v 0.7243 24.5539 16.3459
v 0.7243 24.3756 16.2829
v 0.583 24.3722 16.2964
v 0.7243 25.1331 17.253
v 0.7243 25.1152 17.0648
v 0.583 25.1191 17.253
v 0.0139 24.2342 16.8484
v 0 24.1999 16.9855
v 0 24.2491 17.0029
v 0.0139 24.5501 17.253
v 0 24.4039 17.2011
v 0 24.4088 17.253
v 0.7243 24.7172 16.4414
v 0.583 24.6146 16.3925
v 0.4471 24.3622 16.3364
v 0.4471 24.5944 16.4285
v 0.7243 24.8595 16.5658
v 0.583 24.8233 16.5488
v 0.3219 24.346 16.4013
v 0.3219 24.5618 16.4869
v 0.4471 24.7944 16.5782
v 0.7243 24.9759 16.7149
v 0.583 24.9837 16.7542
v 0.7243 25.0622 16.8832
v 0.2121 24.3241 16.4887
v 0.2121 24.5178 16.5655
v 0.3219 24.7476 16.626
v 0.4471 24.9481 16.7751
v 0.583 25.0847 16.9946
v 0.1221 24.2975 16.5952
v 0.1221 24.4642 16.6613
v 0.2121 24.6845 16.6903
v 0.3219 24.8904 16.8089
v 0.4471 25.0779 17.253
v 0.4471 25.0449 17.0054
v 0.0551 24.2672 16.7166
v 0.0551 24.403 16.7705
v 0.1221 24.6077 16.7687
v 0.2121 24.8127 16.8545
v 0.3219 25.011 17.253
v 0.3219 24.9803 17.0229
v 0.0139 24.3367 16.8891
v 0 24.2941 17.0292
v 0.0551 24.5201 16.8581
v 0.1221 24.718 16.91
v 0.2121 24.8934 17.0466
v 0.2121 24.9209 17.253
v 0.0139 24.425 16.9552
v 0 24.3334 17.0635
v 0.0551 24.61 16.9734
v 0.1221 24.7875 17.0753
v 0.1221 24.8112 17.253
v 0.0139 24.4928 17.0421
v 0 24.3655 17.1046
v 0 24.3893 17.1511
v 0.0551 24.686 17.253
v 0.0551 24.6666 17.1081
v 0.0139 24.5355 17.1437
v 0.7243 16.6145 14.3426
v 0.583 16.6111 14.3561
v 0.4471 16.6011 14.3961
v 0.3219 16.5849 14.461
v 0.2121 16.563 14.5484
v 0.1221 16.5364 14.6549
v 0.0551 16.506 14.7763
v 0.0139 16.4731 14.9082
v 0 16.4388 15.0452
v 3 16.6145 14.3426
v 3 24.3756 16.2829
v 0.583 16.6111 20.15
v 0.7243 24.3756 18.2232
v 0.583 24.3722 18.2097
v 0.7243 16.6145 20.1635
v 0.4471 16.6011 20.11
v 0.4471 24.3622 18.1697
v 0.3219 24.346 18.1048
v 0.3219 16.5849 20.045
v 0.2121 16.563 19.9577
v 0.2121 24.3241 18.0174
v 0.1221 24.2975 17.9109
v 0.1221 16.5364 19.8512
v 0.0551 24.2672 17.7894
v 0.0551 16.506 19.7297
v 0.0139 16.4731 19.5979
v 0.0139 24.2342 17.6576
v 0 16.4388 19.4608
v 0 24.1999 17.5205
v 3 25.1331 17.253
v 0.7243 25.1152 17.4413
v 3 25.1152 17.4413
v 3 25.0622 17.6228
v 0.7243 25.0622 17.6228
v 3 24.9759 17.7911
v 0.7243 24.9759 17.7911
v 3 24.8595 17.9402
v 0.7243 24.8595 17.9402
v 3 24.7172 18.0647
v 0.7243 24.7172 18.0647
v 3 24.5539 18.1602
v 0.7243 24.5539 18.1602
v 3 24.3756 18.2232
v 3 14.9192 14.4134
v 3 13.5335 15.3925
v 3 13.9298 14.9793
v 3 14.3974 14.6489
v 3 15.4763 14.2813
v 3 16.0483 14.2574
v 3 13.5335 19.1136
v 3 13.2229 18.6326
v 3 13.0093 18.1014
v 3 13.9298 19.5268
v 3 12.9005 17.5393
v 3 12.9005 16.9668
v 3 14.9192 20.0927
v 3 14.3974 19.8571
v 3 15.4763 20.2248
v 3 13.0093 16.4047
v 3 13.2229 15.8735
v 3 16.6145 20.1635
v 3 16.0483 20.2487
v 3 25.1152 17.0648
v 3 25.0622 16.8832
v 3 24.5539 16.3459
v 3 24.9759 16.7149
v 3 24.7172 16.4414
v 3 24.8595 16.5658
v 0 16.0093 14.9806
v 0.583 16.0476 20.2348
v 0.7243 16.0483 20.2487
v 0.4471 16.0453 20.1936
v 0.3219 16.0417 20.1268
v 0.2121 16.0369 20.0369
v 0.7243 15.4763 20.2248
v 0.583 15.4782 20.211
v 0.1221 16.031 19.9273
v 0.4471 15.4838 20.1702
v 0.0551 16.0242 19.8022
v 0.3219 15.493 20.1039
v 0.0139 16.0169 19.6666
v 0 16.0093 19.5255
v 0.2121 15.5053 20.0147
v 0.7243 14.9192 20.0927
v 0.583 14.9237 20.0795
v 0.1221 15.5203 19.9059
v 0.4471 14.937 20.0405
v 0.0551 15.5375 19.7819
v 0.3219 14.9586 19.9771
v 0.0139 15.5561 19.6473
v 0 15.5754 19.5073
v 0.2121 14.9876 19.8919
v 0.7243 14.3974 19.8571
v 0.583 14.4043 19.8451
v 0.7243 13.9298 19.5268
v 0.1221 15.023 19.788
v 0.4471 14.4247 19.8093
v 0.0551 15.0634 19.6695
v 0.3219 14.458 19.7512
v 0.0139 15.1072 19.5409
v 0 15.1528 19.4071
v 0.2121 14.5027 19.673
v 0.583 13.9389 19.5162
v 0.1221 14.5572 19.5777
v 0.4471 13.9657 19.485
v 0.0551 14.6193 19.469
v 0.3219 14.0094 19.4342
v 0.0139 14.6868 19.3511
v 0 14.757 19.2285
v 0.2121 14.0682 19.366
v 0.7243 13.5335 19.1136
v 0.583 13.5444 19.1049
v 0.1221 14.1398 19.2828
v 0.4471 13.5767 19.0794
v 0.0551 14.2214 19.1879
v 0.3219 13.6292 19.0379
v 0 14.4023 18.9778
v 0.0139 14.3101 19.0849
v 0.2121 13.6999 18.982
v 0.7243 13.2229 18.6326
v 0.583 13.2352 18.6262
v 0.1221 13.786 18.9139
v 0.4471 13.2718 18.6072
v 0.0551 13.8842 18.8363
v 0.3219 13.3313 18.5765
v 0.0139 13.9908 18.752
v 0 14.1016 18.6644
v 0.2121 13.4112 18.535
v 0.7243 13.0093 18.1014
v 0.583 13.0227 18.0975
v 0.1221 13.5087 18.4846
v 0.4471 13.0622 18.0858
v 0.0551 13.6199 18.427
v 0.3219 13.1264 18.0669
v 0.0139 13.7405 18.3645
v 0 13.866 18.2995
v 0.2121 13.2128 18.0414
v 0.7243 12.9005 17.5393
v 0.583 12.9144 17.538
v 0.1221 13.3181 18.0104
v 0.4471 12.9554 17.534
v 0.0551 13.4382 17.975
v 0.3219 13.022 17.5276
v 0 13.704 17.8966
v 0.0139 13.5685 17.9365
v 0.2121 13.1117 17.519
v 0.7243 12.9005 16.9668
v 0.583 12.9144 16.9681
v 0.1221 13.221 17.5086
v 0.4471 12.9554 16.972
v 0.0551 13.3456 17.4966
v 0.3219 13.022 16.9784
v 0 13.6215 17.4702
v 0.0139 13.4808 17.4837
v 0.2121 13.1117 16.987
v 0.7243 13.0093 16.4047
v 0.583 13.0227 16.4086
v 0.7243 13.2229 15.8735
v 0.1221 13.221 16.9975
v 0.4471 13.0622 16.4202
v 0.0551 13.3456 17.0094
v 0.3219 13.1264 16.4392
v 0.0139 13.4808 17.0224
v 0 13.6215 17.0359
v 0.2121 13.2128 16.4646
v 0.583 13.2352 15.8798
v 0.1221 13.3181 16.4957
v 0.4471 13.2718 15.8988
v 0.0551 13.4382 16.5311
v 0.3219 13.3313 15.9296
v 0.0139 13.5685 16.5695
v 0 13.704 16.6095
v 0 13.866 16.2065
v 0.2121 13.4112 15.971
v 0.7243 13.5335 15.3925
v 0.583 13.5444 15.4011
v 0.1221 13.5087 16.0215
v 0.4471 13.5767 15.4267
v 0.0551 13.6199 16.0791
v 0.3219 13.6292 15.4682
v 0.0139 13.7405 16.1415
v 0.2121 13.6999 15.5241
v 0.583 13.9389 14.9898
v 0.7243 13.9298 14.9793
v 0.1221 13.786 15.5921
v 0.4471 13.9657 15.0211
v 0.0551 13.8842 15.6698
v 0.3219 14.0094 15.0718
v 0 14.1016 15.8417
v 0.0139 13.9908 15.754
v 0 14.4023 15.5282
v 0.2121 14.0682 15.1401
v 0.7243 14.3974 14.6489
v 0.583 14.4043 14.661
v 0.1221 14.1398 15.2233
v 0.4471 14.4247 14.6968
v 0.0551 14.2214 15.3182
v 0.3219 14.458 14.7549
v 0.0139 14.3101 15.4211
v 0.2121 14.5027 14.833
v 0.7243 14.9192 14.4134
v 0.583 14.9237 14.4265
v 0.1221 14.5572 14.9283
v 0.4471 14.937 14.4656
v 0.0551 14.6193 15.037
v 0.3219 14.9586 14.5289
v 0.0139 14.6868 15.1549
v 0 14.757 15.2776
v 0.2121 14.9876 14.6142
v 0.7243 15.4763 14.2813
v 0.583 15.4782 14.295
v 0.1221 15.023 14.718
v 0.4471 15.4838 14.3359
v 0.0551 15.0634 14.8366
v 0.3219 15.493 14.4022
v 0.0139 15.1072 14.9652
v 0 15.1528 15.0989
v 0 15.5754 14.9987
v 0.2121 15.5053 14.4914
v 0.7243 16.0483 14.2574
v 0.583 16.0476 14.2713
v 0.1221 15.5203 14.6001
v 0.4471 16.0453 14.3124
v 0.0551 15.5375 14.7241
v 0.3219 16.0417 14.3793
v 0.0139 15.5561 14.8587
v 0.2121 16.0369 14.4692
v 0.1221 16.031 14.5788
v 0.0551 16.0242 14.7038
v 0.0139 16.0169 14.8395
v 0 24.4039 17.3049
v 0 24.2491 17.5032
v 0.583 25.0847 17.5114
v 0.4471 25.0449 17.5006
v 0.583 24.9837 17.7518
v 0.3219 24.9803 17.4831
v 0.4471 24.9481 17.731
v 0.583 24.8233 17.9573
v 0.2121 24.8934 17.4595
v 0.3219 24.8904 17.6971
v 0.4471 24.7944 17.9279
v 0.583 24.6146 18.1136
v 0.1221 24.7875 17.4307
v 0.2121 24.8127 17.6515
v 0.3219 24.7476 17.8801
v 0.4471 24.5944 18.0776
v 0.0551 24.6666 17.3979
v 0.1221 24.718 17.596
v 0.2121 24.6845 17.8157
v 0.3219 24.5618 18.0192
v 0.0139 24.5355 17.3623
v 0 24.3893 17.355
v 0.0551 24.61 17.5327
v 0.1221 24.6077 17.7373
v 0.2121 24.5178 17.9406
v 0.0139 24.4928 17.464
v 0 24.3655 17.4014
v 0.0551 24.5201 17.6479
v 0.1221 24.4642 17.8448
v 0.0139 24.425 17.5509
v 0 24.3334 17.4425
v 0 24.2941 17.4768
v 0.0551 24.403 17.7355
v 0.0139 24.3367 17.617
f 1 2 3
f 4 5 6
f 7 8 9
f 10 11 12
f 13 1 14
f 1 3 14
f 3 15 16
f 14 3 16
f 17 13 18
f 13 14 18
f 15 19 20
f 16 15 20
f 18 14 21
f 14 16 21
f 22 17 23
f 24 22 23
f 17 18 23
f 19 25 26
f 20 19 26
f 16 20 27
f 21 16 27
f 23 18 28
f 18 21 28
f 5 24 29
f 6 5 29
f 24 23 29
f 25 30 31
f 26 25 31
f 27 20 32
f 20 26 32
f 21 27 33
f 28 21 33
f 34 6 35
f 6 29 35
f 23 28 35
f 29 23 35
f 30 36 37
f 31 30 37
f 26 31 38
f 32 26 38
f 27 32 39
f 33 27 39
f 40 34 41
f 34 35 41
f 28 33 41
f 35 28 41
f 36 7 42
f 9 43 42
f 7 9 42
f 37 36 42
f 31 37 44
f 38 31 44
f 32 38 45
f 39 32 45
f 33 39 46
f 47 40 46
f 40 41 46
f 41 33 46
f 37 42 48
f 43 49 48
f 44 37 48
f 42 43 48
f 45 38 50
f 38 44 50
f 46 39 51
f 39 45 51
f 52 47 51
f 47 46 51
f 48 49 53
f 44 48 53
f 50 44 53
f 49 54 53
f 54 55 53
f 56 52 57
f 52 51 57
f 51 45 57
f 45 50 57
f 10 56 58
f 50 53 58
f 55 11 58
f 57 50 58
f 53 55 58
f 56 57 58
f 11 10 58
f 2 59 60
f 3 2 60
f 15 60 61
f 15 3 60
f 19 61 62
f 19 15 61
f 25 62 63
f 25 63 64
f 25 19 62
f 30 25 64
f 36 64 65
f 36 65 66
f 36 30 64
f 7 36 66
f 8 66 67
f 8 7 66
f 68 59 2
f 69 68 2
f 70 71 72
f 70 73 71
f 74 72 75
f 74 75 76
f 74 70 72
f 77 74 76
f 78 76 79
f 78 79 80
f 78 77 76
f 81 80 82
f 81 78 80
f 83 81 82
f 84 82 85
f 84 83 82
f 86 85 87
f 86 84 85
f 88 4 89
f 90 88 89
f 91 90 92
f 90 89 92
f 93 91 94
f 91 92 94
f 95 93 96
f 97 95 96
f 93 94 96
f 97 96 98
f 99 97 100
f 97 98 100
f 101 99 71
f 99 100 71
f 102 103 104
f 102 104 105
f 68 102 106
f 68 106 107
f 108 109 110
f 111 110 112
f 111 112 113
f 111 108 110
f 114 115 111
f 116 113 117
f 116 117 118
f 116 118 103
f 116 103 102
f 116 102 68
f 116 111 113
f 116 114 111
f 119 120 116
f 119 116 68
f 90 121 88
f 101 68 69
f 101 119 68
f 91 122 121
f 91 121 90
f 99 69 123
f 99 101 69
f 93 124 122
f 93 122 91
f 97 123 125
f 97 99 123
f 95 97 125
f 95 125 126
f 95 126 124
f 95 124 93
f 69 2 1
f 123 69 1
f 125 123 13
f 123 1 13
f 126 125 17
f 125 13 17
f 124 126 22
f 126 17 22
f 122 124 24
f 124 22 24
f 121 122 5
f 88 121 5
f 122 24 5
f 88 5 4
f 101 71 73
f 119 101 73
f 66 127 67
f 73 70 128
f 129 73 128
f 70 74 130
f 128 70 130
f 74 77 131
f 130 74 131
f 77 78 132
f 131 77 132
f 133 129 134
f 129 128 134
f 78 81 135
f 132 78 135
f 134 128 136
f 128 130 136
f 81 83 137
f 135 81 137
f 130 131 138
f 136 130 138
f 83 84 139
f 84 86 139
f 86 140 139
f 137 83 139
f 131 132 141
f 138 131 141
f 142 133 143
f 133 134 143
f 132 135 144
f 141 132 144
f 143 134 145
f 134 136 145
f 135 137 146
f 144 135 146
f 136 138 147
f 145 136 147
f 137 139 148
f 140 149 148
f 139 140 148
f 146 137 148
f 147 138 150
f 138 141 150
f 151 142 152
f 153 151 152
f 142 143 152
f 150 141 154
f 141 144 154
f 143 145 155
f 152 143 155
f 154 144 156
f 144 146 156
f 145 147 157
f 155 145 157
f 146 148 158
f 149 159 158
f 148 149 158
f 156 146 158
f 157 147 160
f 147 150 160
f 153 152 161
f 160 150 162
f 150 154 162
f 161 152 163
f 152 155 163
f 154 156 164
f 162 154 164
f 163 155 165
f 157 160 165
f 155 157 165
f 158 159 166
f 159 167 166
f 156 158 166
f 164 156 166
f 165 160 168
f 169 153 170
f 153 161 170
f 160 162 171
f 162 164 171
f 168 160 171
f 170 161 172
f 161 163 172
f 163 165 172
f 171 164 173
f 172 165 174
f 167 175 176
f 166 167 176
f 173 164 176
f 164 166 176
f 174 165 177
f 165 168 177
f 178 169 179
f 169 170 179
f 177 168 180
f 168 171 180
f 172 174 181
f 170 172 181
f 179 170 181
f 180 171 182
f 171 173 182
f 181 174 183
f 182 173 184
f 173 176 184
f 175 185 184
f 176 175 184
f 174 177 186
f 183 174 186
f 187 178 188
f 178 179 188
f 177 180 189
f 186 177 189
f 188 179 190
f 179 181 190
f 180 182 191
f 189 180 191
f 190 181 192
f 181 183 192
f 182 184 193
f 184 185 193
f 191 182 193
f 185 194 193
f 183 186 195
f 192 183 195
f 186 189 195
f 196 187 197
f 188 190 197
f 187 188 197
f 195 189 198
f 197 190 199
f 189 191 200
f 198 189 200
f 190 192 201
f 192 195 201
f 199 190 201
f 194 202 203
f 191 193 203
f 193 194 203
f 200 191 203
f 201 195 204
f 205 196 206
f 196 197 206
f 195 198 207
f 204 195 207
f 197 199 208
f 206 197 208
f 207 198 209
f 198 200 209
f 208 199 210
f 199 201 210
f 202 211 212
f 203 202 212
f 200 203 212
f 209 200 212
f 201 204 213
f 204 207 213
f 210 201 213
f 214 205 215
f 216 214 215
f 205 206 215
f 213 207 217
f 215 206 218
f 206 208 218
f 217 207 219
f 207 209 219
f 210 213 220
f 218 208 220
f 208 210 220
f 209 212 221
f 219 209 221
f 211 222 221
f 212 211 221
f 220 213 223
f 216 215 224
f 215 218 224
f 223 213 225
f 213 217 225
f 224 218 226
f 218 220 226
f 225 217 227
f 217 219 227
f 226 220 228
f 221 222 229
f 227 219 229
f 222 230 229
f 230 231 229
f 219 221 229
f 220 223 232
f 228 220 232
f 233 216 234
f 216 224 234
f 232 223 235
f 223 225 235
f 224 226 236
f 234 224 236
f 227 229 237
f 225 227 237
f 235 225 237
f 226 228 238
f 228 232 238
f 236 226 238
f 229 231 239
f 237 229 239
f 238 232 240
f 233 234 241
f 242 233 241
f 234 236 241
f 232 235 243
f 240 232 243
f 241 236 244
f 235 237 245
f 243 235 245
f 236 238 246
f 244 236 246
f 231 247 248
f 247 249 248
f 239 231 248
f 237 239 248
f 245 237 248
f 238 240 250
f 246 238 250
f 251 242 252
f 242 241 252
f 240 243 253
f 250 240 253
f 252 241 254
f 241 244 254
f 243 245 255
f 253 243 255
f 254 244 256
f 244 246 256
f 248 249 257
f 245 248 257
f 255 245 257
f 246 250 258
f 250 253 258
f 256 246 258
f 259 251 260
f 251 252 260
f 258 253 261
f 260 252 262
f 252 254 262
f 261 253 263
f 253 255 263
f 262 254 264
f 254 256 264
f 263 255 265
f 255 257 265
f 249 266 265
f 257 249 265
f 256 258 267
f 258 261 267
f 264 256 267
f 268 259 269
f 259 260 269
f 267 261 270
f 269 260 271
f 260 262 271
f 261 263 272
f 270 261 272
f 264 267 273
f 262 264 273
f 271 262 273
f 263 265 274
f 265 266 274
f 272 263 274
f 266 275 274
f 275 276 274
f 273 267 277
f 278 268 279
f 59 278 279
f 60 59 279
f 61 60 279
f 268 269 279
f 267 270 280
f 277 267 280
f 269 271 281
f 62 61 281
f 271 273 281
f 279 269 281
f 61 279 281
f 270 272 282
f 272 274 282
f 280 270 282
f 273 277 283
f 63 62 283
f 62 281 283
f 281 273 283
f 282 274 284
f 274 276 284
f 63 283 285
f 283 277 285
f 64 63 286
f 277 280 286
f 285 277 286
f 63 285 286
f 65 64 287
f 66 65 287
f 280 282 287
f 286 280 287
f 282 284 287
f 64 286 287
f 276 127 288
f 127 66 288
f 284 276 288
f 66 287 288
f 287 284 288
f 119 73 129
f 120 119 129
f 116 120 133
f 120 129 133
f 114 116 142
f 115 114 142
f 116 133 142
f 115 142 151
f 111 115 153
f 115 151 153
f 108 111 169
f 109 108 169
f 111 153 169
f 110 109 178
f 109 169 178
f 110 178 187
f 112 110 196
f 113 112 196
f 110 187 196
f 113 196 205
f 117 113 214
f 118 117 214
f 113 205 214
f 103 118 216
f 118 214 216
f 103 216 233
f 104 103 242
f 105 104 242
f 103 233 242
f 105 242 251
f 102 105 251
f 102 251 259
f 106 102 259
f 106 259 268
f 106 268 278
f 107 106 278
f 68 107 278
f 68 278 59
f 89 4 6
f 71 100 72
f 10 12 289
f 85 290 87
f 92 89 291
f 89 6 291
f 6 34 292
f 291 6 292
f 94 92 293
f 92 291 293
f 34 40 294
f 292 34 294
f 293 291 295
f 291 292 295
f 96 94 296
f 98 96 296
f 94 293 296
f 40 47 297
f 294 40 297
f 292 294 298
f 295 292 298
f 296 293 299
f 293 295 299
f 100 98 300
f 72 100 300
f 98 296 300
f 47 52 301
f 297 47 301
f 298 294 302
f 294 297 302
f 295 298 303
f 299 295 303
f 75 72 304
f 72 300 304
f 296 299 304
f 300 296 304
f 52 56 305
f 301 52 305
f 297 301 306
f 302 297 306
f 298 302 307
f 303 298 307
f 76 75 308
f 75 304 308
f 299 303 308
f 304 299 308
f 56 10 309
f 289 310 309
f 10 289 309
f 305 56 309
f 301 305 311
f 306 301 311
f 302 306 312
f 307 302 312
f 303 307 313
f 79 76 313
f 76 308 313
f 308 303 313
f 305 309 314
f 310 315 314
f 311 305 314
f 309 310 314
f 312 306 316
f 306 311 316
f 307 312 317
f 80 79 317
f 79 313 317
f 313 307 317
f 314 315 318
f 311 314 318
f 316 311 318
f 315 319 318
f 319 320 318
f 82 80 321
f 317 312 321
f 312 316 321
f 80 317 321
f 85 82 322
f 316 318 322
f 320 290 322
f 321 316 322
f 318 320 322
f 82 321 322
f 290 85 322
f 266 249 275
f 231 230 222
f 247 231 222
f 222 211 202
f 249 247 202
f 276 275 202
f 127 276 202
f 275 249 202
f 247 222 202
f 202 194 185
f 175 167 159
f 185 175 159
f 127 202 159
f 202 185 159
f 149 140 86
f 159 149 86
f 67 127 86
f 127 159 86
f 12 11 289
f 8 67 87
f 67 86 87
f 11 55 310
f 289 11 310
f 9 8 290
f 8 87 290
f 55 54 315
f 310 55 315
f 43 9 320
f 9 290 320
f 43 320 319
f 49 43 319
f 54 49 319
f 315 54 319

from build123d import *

# Parameters (mm, degrees)
F1_DEPTH = 3
F2_R     = 0.724264


with BuildPart() as f1:
    # F0 (on Right) → F1 (new body)
    with BuildSketch(Plane.YZ):
        with BuildLine():
            ThreePointArc((16.614459, 14.342597), (18.251469, 15.406788), (18.886853, 17.253025))
            ThreePointArc((18.886853, 17.253025), (18.251469, 19.099261), (16.614459, 20.163452))
            ThreePointArc((16.614459, 20.163452), (12.886853, 17.253025), (16.614459, 14.342597))
        make_face()
        with BuildLine():
            ThreePointArc((16.614459, 20.163452), (18.251469, 19.099261), (18.886853, 17.253025))
            ThreePointArc((18.886853, 17.253025), (18.251469, 15.406788), (16.614459, 14.342597))
            Line((16.614459, 14.342597), (24.375599, 16.282882))
            ThreePointArc((24.375599, 16.282882), (23.133064, 17.253025), (24.375599, 18.223167))
            Line((24.375599, 18.223167), (16.614459, 20.163452))
        make_face()
        with BuildLine():
            ThreePointArc((25.133064, 17.253025), (24.921269, 17.868437), (24.375599, 18.223167))
            ThreePointArc((24.375599, 18.223167), (23.133064, 17.253025), (24.375599, 16.282882))
            ThreePointArc((24.375599, 16.282882), (24.921269, 16.637612), (25.133064, 17.253025))
        make_face()
    extrude(amount=F1_DEPTH)

    # F2
    f2_edges = [f1.edges().sort_by_distance(p)[0] for p in [
        (0, 20.495029, 19.19331),
    ]]
    fillet(f2_edges, radius=F2_R)


solid = f1.part
